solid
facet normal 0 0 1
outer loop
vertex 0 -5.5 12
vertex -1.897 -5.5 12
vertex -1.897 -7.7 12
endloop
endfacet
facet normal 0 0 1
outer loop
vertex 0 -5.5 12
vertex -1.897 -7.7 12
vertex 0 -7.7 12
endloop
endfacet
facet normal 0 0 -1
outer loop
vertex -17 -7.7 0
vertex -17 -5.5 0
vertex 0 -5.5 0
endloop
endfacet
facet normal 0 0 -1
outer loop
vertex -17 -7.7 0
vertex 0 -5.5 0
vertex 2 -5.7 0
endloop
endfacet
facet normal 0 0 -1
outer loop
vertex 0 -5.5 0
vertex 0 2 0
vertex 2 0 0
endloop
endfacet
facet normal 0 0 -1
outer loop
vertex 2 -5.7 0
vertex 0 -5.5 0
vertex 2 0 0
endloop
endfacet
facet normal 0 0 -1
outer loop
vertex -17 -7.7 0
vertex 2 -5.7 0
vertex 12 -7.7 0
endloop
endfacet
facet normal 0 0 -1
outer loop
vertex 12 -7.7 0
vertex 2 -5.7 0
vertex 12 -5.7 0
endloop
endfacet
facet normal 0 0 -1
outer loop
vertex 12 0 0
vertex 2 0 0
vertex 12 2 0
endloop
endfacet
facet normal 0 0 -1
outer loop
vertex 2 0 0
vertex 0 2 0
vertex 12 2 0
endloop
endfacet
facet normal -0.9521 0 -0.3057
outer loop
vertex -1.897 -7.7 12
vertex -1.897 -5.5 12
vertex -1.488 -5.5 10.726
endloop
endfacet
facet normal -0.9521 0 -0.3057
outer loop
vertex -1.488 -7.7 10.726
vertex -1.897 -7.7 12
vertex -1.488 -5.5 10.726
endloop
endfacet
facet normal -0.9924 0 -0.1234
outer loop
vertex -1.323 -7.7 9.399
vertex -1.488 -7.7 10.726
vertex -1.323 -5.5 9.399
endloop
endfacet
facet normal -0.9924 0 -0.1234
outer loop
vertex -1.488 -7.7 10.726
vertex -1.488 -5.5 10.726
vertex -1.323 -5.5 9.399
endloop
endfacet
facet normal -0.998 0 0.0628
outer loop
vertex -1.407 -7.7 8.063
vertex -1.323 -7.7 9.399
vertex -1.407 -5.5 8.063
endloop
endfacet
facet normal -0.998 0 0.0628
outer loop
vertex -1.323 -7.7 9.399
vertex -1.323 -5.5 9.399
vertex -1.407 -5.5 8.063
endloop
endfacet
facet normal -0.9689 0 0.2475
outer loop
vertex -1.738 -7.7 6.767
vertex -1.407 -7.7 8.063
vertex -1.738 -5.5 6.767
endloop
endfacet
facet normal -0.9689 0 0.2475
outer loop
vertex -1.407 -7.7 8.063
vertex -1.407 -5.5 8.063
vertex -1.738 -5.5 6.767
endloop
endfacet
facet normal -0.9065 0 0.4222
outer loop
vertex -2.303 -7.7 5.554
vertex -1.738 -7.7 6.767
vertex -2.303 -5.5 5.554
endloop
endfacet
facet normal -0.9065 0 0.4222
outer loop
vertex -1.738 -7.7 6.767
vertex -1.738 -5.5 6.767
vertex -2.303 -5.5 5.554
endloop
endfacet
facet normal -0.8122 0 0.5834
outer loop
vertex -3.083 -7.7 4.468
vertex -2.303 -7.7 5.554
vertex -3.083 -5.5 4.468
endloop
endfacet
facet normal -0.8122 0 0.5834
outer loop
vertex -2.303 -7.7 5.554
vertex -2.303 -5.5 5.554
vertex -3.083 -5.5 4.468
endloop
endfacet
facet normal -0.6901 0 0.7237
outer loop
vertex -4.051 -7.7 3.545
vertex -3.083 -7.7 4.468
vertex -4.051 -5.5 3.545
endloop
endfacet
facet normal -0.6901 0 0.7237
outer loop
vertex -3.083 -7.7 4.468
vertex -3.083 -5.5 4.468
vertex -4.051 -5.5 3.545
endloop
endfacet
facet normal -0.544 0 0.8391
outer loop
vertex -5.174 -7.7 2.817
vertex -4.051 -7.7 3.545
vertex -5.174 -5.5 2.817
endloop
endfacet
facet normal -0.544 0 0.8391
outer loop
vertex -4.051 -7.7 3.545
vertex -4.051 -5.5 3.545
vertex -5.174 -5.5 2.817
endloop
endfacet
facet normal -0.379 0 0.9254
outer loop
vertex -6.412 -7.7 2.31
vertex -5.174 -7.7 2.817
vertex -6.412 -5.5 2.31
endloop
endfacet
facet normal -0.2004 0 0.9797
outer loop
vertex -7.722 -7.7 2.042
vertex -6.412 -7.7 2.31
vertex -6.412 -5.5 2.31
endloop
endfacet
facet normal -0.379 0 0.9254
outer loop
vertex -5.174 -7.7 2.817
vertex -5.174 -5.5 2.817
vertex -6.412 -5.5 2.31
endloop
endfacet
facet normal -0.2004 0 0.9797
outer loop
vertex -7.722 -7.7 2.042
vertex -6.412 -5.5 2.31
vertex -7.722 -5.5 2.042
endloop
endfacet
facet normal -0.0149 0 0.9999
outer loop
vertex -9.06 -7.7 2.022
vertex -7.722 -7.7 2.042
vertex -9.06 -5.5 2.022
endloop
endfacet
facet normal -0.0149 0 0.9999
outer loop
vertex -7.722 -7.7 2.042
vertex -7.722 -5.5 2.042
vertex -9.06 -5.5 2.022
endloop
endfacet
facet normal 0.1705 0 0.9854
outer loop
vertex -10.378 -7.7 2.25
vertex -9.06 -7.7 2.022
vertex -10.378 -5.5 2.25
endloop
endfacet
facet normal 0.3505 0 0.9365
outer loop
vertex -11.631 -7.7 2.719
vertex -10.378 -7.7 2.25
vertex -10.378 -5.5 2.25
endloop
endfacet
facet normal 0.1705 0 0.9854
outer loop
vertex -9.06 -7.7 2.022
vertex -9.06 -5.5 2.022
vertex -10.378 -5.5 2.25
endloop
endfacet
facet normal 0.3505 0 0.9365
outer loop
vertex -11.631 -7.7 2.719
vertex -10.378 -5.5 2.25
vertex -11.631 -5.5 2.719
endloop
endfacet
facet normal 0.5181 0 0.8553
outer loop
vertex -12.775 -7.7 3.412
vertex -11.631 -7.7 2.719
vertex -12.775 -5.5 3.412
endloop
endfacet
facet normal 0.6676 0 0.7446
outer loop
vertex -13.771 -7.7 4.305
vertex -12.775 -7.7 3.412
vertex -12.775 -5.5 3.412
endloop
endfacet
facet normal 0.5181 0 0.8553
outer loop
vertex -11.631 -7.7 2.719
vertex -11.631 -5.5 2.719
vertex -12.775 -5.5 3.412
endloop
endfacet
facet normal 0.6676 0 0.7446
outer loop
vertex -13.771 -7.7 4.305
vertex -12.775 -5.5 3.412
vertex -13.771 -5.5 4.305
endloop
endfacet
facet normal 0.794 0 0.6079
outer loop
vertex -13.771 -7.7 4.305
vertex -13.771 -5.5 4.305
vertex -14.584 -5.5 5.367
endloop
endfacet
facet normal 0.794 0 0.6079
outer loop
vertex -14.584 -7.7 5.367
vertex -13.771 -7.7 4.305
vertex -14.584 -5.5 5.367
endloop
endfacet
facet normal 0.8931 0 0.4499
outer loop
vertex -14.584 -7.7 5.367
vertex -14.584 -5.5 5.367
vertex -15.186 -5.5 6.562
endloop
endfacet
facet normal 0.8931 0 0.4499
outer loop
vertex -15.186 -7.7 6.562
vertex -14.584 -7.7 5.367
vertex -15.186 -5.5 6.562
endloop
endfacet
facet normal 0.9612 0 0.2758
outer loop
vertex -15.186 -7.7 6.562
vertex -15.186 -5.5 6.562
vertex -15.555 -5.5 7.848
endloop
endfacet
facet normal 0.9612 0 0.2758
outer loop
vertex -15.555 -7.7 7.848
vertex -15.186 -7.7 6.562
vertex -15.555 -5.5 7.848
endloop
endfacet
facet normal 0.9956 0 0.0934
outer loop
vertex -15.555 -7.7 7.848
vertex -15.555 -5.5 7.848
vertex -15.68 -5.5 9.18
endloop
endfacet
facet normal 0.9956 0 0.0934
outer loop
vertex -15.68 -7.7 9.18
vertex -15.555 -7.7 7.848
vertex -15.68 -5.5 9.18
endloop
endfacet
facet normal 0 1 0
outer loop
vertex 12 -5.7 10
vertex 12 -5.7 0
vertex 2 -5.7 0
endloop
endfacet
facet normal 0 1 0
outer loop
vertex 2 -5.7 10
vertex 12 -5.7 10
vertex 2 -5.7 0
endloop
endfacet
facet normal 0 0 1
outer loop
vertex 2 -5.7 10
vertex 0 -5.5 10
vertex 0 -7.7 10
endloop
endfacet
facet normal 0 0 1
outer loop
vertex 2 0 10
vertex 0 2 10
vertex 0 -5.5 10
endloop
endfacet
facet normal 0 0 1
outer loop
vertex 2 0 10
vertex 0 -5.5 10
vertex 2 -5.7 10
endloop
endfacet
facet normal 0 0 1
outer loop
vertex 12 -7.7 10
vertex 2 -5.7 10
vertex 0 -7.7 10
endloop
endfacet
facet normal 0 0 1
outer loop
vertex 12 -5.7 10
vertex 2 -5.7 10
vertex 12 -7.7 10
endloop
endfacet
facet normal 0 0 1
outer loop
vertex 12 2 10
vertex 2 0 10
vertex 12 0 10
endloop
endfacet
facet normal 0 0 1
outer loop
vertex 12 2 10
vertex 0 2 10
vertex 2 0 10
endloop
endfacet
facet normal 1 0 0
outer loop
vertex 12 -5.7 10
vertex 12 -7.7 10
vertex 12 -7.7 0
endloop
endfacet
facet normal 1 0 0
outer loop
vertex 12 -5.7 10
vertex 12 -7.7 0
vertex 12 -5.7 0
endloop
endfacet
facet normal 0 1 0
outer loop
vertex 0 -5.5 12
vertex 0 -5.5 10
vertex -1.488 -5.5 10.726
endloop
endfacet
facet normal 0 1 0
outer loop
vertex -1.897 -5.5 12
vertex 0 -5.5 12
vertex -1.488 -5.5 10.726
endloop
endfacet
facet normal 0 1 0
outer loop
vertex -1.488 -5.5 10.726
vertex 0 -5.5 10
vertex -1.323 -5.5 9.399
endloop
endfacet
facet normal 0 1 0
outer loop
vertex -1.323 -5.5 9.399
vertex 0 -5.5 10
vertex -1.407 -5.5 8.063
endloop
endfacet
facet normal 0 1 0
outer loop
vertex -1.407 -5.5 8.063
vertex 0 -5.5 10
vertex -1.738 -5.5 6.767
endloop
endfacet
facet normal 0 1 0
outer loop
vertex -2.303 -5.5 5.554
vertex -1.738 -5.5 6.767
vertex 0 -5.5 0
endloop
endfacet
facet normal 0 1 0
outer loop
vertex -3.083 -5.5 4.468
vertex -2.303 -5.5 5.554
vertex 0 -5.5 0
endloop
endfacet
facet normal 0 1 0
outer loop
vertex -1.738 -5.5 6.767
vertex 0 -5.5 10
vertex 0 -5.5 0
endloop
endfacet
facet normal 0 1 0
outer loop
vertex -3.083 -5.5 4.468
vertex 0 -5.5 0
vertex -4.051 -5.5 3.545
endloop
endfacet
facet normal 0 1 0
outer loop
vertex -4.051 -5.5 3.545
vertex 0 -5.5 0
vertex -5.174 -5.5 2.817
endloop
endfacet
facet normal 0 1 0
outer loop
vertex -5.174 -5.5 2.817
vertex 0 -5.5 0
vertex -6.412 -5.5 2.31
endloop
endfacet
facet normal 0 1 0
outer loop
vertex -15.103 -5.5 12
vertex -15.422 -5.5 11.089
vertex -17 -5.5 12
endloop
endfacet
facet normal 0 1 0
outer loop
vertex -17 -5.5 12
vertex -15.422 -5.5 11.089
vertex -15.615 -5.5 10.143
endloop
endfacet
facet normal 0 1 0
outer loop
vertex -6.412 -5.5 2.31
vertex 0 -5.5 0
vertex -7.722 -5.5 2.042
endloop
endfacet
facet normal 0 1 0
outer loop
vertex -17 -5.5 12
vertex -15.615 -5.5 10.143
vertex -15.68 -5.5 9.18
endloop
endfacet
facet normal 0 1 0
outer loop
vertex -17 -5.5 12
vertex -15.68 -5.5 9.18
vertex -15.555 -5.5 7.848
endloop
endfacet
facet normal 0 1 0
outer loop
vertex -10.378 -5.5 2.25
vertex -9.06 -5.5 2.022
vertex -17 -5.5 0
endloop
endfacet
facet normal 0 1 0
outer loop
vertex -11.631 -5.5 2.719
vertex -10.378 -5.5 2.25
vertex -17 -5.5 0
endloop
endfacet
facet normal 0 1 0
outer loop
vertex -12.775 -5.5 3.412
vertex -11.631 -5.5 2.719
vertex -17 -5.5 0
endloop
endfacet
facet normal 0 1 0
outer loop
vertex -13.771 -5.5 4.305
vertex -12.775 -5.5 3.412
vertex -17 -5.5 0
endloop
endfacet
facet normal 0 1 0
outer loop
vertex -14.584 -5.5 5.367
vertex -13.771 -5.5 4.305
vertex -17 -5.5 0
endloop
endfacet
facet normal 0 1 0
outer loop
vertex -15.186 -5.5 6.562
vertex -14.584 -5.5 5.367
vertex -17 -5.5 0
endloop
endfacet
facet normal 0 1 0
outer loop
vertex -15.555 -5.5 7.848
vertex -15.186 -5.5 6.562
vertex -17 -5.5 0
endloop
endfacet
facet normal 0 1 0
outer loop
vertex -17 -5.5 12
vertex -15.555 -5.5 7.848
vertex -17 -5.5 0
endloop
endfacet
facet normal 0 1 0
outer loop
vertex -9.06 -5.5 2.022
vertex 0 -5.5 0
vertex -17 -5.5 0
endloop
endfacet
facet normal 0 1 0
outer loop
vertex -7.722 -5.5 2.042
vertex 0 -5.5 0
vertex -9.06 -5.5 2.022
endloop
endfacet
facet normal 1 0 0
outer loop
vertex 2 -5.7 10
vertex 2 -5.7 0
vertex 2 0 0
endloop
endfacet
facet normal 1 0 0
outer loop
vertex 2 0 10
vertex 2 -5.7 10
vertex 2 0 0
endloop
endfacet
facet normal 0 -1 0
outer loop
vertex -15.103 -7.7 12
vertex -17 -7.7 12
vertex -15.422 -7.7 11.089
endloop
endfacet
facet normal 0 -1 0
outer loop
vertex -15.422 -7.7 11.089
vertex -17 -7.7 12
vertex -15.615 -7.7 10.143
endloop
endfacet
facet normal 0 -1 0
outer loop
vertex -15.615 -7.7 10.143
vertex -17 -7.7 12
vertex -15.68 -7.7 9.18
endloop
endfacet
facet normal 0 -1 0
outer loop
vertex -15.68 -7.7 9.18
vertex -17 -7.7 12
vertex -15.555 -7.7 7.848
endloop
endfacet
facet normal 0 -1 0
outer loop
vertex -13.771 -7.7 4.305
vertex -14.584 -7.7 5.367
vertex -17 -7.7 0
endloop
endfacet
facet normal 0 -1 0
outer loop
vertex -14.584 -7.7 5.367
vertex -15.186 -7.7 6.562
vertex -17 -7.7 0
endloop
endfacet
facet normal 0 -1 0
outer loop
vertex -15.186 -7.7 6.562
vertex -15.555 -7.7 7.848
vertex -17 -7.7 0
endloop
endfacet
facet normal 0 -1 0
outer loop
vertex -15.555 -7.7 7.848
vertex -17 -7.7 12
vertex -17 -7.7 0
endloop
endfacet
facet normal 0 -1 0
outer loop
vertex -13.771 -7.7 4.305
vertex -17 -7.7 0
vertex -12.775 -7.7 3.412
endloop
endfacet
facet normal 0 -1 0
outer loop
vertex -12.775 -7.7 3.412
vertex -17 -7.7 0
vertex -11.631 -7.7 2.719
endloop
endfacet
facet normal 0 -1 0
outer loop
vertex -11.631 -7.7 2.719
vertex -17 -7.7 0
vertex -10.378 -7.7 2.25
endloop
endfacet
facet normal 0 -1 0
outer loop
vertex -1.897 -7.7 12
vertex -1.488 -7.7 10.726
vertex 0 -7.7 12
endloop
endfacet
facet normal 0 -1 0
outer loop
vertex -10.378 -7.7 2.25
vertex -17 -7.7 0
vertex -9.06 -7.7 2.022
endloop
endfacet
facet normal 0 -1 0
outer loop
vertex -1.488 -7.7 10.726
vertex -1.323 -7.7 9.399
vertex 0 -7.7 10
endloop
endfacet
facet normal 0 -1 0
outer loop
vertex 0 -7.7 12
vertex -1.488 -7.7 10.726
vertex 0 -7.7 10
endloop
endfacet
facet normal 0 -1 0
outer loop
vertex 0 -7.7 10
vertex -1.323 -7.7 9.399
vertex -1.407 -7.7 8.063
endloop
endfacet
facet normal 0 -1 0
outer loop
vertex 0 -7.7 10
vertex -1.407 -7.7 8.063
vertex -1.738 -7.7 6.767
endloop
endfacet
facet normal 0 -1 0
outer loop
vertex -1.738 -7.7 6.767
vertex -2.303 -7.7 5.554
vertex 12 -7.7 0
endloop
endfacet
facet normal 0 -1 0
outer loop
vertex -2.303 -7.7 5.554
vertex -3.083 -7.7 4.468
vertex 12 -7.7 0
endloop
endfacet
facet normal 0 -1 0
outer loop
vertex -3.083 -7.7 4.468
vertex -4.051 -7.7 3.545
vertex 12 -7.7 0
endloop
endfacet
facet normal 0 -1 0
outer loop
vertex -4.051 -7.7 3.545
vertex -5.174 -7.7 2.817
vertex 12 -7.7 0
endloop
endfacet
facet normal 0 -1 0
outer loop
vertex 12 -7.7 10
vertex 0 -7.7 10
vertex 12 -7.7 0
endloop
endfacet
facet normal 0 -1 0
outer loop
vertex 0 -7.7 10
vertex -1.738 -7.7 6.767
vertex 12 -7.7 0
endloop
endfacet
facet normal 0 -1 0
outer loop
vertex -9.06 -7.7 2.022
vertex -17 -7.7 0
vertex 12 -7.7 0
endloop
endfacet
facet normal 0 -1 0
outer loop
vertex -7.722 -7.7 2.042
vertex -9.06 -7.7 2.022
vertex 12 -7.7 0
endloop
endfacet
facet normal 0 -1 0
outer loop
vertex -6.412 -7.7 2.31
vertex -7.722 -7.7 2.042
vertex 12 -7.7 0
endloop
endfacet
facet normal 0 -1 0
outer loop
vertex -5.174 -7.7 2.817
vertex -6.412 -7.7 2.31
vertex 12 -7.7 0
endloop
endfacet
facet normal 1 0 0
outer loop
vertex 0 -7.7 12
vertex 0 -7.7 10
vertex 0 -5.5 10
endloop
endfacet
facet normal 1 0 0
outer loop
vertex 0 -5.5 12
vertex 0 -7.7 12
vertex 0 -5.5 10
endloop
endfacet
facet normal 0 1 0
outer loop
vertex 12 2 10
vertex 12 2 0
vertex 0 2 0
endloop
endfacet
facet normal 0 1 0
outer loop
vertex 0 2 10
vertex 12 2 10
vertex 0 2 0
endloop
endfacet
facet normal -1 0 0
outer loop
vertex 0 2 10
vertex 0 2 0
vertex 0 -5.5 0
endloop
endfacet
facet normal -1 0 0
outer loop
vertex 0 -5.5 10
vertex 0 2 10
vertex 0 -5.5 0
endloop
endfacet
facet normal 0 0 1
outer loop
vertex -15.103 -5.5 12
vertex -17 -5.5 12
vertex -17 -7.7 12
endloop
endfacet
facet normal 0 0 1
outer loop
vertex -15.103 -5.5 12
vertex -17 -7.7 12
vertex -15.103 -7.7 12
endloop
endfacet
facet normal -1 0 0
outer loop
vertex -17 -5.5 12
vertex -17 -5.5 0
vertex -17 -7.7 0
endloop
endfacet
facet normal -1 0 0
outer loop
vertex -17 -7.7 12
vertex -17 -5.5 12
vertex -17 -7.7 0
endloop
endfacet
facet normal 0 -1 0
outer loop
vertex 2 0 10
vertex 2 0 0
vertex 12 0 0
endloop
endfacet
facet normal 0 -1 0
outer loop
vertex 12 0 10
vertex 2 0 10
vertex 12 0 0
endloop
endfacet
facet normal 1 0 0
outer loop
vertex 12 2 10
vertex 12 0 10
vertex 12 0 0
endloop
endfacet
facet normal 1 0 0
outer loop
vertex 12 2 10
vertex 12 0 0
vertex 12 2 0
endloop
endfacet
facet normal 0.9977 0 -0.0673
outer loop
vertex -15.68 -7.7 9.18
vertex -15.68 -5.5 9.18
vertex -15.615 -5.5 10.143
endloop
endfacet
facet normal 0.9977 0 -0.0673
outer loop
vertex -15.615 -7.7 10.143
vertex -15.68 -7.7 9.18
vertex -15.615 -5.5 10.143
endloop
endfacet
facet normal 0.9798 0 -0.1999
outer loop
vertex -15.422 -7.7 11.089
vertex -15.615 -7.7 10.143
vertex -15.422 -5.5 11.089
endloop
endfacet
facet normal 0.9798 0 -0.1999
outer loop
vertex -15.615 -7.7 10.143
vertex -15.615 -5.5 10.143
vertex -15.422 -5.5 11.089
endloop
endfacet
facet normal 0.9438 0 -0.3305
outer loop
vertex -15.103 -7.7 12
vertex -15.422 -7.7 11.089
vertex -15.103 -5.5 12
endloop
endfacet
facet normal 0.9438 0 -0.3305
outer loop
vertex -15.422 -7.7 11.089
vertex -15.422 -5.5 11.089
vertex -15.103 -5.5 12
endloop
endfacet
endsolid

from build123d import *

# Parameters (mm, degrees)
F1_DEPTH = 10
F2_DEPTH = 12
F4_DEPTH = 25


with BuildPart() as f1:
    # F0 (on Top) → F1 (new body)
    with BuildSketch(Plane.XY):
        Polygon((2, -5.5), (2, 0), (10.000001, 0), (12.000001, 0), (12.000001, 2), (10.000001, 2), (0, 2), (0, 0), (0, -5.5), align=None)
        Polygon((2, -5.7), (2, -5.5), (0, -5.5), (0, -5.7), (0, -7.7), (10.000001, -7.7), (12.000001, -7.7), (12.000001, -5.7), (10.000001, -5.7), align=None)
    extrude(amount=F1_DEPTH)

    # F0 (on Top) → F2 (join)
    with BuildSketch(Plane.XY):
        Polygon((0, -5.7), (0, -5.5), (-7.940744, -5.5), (-13.940744, -5.5), (-16, -5.5), (-17, -5.5), (-17, -7.7), (-16, -7.7), (-15, -7.7), (-10, -7.7), (-7.940744, -7.7), (0, -7.7), align=None)
    extrude(amount=F2_DEPTH)

    # F3 (on face) → F4 (cut)
    with BuildSketch(Plane(origin=(0, -5.5, 0), x_dir=(-1, 0, 0), z_dir=(0, 1, 0))):
        with BuildLine():
            ThreePointArc((1.89697, 12), (7.060791, 2.145721), (15.68, 9.18))
            ThreePointArc((15.68, 9.18), (15.534279, 10.619209), (15.10303, 12))
            Line((15.10303, 12), (1.89697, 12))
        make_face()
    extrude(amount=-F4_DEPTH, mode=Mode.SUBTRACT)


solid = f1.part
